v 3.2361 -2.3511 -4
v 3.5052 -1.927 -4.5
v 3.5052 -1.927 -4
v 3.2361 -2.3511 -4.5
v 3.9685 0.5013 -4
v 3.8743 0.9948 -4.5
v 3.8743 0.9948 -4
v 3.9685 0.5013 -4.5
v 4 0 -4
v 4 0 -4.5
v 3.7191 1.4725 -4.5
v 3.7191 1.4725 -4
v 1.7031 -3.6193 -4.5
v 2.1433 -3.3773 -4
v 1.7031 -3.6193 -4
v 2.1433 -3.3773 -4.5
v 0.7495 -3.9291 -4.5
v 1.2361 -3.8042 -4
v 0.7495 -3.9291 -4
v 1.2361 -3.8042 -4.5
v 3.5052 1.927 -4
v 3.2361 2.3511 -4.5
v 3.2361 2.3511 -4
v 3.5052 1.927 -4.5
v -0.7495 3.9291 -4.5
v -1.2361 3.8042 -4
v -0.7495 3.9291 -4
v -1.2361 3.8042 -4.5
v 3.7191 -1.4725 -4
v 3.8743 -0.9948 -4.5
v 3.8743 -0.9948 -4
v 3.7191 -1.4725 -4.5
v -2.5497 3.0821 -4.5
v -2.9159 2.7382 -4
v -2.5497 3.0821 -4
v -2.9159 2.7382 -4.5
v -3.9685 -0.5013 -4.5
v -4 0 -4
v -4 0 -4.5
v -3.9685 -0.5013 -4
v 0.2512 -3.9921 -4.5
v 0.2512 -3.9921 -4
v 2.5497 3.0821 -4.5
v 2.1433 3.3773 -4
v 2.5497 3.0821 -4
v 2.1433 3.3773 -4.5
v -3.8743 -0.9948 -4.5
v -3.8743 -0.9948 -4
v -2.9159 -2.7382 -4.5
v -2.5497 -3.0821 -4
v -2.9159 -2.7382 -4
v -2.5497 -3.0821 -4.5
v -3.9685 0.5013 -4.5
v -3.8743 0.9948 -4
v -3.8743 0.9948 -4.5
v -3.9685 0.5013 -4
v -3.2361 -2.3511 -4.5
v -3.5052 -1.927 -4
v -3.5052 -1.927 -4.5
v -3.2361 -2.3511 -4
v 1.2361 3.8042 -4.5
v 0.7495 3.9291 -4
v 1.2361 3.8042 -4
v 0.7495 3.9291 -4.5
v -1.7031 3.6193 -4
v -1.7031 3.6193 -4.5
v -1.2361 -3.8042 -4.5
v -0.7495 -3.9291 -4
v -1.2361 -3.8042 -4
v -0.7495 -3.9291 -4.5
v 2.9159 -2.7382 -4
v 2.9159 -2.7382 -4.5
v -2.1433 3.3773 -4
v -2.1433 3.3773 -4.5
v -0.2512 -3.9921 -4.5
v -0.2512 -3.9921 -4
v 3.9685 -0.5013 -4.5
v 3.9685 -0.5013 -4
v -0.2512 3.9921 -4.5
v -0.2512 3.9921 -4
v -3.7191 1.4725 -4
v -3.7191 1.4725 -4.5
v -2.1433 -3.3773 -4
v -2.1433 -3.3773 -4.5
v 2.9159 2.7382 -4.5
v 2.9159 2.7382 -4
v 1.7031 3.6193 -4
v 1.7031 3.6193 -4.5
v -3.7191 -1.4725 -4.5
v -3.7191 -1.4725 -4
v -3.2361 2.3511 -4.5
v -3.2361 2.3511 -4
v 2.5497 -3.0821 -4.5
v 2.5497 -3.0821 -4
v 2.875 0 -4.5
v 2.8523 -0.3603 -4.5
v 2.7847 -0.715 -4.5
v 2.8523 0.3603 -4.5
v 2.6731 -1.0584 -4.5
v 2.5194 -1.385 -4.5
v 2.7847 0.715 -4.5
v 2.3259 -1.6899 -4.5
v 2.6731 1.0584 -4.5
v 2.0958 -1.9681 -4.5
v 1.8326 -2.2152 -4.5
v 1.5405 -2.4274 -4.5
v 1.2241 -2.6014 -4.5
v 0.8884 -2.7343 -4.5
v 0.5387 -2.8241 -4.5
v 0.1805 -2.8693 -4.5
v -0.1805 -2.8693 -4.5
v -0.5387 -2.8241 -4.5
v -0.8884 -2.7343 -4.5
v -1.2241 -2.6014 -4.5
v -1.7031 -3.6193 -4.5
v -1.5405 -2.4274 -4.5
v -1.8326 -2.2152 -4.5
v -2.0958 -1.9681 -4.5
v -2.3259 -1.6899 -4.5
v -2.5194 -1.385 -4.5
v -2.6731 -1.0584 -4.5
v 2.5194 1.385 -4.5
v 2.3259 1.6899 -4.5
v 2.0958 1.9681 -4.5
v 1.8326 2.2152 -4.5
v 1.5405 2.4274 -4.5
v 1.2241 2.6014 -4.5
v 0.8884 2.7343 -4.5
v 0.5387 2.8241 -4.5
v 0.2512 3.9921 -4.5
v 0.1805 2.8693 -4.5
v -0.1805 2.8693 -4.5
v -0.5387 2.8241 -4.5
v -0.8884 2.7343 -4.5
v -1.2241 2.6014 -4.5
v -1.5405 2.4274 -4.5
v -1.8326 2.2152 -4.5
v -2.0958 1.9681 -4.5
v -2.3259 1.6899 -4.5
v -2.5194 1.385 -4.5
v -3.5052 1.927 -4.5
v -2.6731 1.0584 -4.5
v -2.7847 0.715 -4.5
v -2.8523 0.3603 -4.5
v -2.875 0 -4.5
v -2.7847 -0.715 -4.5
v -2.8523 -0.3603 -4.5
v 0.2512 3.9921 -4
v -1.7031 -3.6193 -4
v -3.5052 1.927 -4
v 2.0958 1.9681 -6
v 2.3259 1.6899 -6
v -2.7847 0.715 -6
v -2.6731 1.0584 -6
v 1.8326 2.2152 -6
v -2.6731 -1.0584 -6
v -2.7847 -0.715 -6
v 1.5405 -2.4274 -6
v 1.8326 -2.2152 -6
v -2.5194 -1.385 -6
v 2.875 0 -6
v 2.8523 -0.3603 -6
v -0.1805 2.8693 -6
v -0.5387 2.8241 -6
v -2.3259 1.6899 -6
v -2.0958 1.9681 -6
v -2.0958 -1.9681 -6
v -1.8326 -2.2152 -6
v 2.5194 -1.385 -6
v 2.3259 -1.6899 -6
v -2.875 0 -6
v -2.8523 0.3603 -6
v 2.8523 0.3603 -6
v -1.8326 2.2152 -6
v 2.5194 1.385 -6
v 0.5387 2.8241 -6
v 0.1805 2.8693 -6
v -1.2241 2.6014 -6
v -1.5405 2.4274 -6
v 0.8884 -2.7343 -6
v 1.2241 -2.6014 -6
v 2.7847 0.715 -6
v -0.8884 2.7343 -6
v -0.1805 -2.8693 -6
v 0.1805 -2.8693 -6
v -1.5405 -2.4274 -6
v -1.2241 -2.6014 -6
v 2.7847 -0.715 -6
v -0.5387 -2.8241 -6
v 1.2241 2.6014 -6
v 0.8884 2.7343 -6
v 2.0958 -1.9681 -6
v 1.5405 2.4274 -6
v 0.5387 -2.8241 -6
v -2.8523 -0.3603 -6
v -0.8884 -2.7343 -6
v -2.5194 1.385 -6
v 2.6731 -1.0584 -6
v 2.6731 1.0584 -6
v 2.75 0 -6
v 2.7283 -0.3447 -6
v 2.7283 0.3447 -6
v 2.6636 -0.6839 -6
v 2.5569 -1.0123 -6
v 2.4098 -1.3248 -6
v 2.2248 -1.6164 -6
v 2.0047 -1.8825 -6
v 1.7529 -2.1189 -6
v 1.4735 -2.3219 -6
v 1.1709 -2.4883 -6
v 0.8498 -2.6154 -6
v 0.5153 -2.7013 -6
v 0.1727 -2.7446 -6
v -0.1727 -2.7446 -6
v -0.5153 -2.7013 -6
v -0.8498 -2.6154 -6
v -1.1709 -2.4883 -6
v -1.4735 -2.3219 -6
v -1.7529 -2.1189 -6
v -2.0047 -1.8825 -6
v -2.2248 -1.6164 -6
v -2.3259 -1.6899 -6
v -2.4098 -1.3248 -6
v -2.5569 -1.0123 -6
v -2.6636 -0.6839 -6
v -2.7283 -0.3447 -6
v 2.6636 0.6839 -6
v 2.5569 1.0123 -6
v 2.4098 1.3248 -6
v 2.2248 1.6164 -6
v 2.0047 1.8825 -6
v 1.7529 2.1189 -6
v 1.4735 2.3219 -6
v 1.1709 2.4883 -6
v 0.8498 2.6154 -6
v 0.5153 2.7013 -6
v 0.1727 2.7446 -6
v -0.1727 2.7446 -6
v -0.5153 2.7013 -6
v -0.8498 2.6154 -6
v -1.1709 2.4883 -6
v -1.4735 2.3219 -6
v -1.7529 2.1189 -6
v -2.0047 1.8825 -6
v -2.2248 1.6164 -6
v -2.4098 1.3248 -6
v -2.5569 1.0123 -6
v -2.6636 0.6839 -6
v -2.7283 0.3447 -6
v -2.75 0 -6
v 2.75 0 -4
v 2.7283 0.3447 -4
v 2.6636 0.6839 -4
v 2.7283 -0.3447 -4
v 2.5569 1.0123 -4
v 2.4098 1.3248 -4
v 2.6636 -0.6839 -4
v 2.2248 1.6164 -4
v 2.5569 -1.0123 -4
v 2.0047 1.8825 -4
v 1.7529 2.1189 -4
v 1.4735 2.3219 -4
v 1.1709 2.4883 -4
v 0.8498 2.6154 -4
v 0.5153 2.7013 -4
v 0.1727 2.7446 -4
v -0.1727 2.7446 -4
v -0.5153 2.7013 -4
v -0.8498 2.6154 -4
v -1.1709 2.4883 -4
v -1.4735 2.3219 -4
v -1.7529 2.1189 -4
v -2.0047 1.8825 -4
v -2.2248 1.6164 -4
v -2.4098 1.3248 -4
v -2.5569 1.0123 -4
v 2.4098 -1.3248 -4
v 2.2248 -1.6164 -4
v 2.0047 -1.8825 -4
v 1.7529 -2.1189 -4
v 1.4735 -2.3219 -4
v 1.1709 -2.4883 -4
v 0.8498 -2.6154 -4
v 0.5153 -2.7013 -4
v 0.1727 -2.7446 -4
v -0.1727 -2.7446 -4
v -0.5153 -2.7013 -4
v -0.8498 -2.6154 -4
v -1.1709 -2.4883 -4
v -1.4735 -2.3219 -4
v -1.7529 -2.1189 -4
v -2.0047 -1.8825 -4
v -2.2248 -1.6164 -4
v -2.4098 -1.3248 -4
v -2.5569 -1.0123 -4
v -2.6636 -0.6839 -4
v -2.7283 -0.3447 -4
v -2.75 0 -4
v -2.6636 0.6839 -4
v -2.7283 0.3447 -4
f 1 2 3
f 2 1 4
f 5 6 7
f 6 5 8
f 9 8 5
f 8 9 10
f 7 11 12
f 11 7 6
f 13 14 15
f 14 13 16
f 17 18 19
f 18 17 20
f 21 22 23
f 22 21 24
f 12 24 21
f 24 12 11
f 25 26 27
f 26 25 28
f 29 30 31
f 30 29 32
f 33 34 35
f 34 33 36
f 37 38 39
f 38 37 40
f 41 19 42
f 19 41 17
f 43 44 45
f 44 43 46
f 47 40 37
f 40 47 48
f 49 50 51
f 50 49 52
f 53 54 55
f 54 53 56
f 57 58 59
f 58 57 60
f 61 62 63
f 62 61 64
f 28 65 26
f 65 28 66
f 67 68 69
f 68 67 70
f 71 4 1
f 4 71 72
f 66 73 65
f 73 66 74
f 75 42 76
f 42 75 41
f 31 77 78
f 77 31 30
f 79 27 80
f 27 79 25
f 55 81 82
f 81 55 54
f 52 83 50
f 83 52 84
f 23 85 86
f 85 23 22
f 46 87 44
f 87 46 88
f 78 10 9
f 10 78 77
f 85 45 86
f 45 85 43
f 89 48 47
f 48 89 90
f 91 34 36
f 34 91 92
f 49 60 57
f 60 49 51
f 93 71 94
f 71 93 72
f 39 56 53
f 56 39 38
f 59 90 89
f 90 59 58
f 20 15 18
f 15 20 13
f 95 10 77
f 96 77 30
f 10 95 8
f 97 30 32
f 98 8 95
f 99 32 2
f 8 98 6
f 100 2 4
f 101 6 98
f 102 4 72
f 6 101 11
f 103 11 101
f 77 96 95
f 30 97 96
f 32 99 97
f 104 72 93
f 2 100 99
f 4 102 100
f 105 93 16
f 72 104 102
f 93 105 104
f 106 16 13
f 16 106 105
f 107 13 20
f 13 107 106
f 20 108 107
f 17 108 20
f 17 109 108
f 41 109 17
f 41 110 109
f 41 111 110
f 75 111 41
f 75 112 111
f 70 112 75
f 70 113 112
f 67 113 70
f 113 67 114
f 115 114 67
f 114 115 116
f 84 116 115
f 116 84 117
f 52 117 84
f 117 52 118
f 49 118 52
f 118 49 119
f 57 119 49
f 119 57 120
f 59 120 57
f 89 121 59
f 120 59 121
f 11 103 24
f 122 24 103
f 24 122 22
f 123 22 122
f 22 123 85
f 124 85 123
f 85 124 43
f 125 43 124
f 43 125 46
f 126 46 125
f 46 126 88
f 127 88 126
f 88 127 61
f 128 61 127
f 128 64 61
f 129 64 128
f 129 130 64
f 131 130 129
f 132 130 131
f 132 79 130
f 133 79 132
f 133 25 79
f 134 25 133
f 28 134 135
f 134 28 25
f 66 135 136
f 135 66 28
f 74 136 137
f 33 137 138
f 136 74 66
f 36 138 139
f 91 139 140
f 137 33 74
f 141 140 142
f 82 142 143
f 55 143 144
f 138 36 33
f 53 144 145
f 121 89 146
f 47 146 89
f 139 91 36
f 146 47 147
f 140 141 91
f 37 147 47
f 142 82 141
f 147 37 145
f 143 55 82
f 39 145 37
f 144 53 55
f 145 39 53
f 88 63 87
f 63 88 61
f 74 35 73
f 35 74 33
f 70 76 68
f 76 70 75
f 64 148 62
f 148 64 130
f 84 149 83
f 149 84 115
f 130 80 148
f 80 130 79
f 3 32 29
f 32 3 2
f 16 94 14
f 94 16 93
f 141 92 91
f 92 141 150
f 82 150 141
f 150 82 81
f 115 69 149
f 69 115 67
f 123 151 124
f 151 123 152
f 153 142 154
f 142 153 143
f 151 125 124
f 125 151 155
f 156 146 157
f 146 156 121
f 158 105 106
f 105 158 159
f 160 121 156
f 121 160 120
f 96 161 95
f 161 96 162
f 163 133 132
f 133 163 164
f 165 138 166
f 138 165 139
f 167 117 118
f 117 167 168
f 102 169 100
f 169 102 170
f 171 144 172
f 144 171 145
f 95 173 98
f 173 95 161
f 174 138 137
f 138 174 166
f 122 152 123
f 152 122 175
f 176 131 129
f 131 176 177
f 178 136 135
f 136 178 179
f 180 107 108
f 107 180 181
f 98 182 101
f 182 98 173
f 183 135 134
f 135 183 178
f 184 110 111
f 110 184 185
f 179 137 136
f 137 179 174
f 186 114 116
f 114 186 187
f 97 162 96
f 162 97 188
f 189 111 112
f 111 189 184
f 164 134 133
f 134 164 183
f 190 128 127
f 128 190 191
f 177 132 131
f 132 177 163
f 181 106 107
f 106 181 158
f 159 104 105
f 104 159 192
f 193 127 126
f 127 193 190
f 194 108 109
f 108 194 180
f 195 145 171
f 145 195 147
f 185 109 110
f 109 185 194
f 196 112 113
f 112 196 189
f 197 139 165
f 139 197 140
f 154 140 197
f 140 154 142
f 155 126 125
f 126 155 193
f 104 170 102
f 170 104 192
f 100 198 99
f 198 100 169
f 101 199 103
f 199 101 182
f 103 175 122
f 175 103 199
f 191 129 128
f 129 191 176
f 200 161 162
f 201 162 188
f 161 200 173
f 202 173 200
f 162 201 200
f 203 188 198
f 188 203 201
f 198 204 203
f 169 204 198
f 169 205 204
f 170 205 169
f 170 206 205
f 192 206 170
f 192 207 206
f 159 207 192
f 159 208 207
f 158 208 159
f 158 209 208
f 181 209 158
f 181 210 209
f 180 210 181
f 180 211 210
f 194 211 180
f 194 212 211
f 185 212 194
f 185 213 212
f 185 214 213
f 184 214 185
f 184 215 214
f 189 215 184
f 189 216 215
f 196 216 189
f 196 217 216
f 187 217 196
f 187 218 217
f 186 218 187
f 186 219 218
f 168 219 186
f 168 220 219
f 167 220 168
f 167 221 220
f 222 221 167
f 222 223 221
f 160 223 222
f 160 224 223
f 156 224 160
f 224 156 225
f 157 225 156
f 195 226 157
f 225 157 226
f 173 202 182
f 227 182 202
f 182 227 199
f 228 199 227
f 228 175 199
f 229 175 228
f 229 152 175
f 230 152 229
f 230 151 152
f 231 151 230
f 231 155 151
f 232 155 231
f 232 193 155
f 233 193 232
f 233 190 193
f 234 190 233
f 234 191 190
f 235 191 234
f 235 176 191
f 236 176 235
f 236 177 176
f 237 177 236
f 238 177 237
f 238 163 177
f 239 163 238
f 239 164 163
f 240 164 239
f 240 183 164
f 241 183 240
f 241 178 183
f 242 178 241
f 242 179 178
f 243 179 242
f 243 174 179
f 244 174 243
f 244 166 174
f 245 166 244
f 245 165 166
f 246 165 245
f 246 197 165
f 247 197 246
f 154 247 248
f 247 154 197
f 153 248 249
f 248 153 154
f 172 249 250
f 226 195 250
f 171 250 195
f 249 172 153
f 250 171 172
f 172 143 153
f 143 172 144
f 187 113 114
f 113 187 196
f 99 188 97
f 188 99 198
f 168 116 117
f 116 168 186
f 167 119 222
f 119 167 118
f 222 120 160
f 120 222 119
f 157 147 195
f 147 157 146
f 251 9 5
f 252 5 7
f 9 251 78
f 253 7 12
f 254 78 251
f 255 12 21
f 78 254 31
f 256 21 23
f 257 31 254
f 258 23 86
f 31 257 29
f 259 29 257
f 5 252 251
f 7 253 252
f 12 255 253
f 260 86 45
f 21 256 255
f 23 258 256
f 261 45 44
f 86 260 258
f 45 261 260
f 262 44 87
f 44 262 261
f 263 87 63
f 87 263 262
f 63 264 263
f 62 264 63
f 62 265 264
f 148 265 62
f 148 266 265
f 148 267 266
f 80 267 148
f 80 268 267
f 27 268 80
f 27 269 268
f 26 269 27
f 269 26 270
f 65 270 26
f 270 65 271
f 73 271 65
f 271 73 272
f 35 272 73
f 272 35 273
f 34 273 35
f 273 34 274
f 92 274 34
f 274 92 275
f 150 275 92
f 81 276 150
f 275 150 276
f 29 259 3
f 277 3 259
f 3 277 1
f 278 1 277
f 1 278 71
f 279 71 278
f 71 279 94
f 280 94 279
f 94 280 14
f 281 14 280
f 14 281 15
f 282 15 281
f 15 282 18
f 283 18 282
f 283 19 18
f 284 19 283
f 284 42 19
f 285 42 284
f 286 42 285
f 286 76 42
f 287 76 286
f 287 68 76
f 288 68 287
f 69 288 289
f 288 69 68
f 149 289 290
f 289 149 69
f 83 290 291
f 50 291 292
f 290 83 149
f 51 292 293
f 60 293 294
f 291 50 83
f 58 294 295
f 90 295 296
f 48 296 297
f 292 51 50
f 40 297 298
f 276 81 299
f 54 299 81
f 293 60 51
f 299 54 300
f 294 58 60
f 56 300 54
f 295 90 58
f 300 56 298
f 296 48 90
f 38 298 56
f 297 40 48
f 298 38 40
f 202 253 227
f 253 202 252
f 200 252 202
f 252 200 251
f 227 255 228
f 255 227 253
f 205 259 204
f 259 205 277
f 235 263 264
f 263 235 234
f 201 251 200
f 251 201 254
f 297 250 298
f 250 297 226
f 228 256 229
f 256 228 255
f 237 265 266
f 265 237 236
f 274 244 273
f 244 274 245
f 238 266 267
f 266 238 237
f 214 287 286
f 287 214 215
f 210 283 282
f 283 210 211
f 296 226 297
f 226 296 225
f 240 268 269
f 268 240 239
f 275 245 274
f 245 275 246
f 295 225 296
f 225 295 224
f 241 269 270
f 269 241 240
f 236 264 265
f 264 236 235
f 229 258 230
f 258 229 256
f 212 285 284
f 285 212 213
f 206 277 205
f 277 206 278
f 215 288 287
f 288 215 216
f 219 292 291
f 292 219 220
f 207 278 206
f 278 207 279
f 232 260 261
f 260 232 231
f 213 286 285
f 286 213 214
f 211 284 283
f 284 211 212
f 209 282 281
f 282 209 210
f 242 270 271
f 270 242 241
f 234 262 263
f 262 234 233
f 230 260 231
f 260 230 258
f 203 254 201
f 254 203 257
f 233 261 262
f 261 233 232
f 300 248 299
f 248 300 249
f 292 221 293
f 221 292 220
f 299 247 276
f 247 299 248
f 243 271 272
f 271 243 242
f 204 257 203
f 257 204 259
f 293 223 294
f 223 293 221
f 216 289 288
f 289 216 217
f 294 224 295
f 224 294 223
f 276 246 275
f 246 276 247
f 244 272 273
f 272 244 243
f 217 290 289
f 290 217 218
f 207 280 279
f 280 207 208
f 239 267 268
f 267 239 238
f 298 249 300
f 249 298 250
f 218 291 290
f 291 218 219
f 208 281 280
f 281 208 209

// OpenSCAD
$fn = 50;

difference() {
	union() {
		translate(v = [0, 0, -4.5]) {
			cylinder(h = 7.5, r = 4.0);
		}
		#translate(v = [0, 0, -6.0]) {
			cylinder(h = 6, r = 2.875);
		}
	}
	union() {
		translate(v = [0, 0, 0]) {
			rotate(a = [0, 0, 0]) {
				difference() {
					union() {
						translate(v = [0, 0, -4]) {
							linear_extrude(height = 4) {
								polygon(points = [[4.8468, 0.0], [2.4234000000000004, 4.197451927062417], [-2.423399999999999, 4.197451927062417], [-4.8468, 5.935618106107392e-16], [-2.423400000000002, -4.197451927062416], [2.423399999999997, -4.197451927062419]]);
							}
						}
					}
					union();
				}
			}
		}
		#cylinder(h = 3, r = 6.25);
		#translate(v = [0, 0, -100.0]) {
			cylinder(h = 200, r = 2.75);
		}
	}
}
